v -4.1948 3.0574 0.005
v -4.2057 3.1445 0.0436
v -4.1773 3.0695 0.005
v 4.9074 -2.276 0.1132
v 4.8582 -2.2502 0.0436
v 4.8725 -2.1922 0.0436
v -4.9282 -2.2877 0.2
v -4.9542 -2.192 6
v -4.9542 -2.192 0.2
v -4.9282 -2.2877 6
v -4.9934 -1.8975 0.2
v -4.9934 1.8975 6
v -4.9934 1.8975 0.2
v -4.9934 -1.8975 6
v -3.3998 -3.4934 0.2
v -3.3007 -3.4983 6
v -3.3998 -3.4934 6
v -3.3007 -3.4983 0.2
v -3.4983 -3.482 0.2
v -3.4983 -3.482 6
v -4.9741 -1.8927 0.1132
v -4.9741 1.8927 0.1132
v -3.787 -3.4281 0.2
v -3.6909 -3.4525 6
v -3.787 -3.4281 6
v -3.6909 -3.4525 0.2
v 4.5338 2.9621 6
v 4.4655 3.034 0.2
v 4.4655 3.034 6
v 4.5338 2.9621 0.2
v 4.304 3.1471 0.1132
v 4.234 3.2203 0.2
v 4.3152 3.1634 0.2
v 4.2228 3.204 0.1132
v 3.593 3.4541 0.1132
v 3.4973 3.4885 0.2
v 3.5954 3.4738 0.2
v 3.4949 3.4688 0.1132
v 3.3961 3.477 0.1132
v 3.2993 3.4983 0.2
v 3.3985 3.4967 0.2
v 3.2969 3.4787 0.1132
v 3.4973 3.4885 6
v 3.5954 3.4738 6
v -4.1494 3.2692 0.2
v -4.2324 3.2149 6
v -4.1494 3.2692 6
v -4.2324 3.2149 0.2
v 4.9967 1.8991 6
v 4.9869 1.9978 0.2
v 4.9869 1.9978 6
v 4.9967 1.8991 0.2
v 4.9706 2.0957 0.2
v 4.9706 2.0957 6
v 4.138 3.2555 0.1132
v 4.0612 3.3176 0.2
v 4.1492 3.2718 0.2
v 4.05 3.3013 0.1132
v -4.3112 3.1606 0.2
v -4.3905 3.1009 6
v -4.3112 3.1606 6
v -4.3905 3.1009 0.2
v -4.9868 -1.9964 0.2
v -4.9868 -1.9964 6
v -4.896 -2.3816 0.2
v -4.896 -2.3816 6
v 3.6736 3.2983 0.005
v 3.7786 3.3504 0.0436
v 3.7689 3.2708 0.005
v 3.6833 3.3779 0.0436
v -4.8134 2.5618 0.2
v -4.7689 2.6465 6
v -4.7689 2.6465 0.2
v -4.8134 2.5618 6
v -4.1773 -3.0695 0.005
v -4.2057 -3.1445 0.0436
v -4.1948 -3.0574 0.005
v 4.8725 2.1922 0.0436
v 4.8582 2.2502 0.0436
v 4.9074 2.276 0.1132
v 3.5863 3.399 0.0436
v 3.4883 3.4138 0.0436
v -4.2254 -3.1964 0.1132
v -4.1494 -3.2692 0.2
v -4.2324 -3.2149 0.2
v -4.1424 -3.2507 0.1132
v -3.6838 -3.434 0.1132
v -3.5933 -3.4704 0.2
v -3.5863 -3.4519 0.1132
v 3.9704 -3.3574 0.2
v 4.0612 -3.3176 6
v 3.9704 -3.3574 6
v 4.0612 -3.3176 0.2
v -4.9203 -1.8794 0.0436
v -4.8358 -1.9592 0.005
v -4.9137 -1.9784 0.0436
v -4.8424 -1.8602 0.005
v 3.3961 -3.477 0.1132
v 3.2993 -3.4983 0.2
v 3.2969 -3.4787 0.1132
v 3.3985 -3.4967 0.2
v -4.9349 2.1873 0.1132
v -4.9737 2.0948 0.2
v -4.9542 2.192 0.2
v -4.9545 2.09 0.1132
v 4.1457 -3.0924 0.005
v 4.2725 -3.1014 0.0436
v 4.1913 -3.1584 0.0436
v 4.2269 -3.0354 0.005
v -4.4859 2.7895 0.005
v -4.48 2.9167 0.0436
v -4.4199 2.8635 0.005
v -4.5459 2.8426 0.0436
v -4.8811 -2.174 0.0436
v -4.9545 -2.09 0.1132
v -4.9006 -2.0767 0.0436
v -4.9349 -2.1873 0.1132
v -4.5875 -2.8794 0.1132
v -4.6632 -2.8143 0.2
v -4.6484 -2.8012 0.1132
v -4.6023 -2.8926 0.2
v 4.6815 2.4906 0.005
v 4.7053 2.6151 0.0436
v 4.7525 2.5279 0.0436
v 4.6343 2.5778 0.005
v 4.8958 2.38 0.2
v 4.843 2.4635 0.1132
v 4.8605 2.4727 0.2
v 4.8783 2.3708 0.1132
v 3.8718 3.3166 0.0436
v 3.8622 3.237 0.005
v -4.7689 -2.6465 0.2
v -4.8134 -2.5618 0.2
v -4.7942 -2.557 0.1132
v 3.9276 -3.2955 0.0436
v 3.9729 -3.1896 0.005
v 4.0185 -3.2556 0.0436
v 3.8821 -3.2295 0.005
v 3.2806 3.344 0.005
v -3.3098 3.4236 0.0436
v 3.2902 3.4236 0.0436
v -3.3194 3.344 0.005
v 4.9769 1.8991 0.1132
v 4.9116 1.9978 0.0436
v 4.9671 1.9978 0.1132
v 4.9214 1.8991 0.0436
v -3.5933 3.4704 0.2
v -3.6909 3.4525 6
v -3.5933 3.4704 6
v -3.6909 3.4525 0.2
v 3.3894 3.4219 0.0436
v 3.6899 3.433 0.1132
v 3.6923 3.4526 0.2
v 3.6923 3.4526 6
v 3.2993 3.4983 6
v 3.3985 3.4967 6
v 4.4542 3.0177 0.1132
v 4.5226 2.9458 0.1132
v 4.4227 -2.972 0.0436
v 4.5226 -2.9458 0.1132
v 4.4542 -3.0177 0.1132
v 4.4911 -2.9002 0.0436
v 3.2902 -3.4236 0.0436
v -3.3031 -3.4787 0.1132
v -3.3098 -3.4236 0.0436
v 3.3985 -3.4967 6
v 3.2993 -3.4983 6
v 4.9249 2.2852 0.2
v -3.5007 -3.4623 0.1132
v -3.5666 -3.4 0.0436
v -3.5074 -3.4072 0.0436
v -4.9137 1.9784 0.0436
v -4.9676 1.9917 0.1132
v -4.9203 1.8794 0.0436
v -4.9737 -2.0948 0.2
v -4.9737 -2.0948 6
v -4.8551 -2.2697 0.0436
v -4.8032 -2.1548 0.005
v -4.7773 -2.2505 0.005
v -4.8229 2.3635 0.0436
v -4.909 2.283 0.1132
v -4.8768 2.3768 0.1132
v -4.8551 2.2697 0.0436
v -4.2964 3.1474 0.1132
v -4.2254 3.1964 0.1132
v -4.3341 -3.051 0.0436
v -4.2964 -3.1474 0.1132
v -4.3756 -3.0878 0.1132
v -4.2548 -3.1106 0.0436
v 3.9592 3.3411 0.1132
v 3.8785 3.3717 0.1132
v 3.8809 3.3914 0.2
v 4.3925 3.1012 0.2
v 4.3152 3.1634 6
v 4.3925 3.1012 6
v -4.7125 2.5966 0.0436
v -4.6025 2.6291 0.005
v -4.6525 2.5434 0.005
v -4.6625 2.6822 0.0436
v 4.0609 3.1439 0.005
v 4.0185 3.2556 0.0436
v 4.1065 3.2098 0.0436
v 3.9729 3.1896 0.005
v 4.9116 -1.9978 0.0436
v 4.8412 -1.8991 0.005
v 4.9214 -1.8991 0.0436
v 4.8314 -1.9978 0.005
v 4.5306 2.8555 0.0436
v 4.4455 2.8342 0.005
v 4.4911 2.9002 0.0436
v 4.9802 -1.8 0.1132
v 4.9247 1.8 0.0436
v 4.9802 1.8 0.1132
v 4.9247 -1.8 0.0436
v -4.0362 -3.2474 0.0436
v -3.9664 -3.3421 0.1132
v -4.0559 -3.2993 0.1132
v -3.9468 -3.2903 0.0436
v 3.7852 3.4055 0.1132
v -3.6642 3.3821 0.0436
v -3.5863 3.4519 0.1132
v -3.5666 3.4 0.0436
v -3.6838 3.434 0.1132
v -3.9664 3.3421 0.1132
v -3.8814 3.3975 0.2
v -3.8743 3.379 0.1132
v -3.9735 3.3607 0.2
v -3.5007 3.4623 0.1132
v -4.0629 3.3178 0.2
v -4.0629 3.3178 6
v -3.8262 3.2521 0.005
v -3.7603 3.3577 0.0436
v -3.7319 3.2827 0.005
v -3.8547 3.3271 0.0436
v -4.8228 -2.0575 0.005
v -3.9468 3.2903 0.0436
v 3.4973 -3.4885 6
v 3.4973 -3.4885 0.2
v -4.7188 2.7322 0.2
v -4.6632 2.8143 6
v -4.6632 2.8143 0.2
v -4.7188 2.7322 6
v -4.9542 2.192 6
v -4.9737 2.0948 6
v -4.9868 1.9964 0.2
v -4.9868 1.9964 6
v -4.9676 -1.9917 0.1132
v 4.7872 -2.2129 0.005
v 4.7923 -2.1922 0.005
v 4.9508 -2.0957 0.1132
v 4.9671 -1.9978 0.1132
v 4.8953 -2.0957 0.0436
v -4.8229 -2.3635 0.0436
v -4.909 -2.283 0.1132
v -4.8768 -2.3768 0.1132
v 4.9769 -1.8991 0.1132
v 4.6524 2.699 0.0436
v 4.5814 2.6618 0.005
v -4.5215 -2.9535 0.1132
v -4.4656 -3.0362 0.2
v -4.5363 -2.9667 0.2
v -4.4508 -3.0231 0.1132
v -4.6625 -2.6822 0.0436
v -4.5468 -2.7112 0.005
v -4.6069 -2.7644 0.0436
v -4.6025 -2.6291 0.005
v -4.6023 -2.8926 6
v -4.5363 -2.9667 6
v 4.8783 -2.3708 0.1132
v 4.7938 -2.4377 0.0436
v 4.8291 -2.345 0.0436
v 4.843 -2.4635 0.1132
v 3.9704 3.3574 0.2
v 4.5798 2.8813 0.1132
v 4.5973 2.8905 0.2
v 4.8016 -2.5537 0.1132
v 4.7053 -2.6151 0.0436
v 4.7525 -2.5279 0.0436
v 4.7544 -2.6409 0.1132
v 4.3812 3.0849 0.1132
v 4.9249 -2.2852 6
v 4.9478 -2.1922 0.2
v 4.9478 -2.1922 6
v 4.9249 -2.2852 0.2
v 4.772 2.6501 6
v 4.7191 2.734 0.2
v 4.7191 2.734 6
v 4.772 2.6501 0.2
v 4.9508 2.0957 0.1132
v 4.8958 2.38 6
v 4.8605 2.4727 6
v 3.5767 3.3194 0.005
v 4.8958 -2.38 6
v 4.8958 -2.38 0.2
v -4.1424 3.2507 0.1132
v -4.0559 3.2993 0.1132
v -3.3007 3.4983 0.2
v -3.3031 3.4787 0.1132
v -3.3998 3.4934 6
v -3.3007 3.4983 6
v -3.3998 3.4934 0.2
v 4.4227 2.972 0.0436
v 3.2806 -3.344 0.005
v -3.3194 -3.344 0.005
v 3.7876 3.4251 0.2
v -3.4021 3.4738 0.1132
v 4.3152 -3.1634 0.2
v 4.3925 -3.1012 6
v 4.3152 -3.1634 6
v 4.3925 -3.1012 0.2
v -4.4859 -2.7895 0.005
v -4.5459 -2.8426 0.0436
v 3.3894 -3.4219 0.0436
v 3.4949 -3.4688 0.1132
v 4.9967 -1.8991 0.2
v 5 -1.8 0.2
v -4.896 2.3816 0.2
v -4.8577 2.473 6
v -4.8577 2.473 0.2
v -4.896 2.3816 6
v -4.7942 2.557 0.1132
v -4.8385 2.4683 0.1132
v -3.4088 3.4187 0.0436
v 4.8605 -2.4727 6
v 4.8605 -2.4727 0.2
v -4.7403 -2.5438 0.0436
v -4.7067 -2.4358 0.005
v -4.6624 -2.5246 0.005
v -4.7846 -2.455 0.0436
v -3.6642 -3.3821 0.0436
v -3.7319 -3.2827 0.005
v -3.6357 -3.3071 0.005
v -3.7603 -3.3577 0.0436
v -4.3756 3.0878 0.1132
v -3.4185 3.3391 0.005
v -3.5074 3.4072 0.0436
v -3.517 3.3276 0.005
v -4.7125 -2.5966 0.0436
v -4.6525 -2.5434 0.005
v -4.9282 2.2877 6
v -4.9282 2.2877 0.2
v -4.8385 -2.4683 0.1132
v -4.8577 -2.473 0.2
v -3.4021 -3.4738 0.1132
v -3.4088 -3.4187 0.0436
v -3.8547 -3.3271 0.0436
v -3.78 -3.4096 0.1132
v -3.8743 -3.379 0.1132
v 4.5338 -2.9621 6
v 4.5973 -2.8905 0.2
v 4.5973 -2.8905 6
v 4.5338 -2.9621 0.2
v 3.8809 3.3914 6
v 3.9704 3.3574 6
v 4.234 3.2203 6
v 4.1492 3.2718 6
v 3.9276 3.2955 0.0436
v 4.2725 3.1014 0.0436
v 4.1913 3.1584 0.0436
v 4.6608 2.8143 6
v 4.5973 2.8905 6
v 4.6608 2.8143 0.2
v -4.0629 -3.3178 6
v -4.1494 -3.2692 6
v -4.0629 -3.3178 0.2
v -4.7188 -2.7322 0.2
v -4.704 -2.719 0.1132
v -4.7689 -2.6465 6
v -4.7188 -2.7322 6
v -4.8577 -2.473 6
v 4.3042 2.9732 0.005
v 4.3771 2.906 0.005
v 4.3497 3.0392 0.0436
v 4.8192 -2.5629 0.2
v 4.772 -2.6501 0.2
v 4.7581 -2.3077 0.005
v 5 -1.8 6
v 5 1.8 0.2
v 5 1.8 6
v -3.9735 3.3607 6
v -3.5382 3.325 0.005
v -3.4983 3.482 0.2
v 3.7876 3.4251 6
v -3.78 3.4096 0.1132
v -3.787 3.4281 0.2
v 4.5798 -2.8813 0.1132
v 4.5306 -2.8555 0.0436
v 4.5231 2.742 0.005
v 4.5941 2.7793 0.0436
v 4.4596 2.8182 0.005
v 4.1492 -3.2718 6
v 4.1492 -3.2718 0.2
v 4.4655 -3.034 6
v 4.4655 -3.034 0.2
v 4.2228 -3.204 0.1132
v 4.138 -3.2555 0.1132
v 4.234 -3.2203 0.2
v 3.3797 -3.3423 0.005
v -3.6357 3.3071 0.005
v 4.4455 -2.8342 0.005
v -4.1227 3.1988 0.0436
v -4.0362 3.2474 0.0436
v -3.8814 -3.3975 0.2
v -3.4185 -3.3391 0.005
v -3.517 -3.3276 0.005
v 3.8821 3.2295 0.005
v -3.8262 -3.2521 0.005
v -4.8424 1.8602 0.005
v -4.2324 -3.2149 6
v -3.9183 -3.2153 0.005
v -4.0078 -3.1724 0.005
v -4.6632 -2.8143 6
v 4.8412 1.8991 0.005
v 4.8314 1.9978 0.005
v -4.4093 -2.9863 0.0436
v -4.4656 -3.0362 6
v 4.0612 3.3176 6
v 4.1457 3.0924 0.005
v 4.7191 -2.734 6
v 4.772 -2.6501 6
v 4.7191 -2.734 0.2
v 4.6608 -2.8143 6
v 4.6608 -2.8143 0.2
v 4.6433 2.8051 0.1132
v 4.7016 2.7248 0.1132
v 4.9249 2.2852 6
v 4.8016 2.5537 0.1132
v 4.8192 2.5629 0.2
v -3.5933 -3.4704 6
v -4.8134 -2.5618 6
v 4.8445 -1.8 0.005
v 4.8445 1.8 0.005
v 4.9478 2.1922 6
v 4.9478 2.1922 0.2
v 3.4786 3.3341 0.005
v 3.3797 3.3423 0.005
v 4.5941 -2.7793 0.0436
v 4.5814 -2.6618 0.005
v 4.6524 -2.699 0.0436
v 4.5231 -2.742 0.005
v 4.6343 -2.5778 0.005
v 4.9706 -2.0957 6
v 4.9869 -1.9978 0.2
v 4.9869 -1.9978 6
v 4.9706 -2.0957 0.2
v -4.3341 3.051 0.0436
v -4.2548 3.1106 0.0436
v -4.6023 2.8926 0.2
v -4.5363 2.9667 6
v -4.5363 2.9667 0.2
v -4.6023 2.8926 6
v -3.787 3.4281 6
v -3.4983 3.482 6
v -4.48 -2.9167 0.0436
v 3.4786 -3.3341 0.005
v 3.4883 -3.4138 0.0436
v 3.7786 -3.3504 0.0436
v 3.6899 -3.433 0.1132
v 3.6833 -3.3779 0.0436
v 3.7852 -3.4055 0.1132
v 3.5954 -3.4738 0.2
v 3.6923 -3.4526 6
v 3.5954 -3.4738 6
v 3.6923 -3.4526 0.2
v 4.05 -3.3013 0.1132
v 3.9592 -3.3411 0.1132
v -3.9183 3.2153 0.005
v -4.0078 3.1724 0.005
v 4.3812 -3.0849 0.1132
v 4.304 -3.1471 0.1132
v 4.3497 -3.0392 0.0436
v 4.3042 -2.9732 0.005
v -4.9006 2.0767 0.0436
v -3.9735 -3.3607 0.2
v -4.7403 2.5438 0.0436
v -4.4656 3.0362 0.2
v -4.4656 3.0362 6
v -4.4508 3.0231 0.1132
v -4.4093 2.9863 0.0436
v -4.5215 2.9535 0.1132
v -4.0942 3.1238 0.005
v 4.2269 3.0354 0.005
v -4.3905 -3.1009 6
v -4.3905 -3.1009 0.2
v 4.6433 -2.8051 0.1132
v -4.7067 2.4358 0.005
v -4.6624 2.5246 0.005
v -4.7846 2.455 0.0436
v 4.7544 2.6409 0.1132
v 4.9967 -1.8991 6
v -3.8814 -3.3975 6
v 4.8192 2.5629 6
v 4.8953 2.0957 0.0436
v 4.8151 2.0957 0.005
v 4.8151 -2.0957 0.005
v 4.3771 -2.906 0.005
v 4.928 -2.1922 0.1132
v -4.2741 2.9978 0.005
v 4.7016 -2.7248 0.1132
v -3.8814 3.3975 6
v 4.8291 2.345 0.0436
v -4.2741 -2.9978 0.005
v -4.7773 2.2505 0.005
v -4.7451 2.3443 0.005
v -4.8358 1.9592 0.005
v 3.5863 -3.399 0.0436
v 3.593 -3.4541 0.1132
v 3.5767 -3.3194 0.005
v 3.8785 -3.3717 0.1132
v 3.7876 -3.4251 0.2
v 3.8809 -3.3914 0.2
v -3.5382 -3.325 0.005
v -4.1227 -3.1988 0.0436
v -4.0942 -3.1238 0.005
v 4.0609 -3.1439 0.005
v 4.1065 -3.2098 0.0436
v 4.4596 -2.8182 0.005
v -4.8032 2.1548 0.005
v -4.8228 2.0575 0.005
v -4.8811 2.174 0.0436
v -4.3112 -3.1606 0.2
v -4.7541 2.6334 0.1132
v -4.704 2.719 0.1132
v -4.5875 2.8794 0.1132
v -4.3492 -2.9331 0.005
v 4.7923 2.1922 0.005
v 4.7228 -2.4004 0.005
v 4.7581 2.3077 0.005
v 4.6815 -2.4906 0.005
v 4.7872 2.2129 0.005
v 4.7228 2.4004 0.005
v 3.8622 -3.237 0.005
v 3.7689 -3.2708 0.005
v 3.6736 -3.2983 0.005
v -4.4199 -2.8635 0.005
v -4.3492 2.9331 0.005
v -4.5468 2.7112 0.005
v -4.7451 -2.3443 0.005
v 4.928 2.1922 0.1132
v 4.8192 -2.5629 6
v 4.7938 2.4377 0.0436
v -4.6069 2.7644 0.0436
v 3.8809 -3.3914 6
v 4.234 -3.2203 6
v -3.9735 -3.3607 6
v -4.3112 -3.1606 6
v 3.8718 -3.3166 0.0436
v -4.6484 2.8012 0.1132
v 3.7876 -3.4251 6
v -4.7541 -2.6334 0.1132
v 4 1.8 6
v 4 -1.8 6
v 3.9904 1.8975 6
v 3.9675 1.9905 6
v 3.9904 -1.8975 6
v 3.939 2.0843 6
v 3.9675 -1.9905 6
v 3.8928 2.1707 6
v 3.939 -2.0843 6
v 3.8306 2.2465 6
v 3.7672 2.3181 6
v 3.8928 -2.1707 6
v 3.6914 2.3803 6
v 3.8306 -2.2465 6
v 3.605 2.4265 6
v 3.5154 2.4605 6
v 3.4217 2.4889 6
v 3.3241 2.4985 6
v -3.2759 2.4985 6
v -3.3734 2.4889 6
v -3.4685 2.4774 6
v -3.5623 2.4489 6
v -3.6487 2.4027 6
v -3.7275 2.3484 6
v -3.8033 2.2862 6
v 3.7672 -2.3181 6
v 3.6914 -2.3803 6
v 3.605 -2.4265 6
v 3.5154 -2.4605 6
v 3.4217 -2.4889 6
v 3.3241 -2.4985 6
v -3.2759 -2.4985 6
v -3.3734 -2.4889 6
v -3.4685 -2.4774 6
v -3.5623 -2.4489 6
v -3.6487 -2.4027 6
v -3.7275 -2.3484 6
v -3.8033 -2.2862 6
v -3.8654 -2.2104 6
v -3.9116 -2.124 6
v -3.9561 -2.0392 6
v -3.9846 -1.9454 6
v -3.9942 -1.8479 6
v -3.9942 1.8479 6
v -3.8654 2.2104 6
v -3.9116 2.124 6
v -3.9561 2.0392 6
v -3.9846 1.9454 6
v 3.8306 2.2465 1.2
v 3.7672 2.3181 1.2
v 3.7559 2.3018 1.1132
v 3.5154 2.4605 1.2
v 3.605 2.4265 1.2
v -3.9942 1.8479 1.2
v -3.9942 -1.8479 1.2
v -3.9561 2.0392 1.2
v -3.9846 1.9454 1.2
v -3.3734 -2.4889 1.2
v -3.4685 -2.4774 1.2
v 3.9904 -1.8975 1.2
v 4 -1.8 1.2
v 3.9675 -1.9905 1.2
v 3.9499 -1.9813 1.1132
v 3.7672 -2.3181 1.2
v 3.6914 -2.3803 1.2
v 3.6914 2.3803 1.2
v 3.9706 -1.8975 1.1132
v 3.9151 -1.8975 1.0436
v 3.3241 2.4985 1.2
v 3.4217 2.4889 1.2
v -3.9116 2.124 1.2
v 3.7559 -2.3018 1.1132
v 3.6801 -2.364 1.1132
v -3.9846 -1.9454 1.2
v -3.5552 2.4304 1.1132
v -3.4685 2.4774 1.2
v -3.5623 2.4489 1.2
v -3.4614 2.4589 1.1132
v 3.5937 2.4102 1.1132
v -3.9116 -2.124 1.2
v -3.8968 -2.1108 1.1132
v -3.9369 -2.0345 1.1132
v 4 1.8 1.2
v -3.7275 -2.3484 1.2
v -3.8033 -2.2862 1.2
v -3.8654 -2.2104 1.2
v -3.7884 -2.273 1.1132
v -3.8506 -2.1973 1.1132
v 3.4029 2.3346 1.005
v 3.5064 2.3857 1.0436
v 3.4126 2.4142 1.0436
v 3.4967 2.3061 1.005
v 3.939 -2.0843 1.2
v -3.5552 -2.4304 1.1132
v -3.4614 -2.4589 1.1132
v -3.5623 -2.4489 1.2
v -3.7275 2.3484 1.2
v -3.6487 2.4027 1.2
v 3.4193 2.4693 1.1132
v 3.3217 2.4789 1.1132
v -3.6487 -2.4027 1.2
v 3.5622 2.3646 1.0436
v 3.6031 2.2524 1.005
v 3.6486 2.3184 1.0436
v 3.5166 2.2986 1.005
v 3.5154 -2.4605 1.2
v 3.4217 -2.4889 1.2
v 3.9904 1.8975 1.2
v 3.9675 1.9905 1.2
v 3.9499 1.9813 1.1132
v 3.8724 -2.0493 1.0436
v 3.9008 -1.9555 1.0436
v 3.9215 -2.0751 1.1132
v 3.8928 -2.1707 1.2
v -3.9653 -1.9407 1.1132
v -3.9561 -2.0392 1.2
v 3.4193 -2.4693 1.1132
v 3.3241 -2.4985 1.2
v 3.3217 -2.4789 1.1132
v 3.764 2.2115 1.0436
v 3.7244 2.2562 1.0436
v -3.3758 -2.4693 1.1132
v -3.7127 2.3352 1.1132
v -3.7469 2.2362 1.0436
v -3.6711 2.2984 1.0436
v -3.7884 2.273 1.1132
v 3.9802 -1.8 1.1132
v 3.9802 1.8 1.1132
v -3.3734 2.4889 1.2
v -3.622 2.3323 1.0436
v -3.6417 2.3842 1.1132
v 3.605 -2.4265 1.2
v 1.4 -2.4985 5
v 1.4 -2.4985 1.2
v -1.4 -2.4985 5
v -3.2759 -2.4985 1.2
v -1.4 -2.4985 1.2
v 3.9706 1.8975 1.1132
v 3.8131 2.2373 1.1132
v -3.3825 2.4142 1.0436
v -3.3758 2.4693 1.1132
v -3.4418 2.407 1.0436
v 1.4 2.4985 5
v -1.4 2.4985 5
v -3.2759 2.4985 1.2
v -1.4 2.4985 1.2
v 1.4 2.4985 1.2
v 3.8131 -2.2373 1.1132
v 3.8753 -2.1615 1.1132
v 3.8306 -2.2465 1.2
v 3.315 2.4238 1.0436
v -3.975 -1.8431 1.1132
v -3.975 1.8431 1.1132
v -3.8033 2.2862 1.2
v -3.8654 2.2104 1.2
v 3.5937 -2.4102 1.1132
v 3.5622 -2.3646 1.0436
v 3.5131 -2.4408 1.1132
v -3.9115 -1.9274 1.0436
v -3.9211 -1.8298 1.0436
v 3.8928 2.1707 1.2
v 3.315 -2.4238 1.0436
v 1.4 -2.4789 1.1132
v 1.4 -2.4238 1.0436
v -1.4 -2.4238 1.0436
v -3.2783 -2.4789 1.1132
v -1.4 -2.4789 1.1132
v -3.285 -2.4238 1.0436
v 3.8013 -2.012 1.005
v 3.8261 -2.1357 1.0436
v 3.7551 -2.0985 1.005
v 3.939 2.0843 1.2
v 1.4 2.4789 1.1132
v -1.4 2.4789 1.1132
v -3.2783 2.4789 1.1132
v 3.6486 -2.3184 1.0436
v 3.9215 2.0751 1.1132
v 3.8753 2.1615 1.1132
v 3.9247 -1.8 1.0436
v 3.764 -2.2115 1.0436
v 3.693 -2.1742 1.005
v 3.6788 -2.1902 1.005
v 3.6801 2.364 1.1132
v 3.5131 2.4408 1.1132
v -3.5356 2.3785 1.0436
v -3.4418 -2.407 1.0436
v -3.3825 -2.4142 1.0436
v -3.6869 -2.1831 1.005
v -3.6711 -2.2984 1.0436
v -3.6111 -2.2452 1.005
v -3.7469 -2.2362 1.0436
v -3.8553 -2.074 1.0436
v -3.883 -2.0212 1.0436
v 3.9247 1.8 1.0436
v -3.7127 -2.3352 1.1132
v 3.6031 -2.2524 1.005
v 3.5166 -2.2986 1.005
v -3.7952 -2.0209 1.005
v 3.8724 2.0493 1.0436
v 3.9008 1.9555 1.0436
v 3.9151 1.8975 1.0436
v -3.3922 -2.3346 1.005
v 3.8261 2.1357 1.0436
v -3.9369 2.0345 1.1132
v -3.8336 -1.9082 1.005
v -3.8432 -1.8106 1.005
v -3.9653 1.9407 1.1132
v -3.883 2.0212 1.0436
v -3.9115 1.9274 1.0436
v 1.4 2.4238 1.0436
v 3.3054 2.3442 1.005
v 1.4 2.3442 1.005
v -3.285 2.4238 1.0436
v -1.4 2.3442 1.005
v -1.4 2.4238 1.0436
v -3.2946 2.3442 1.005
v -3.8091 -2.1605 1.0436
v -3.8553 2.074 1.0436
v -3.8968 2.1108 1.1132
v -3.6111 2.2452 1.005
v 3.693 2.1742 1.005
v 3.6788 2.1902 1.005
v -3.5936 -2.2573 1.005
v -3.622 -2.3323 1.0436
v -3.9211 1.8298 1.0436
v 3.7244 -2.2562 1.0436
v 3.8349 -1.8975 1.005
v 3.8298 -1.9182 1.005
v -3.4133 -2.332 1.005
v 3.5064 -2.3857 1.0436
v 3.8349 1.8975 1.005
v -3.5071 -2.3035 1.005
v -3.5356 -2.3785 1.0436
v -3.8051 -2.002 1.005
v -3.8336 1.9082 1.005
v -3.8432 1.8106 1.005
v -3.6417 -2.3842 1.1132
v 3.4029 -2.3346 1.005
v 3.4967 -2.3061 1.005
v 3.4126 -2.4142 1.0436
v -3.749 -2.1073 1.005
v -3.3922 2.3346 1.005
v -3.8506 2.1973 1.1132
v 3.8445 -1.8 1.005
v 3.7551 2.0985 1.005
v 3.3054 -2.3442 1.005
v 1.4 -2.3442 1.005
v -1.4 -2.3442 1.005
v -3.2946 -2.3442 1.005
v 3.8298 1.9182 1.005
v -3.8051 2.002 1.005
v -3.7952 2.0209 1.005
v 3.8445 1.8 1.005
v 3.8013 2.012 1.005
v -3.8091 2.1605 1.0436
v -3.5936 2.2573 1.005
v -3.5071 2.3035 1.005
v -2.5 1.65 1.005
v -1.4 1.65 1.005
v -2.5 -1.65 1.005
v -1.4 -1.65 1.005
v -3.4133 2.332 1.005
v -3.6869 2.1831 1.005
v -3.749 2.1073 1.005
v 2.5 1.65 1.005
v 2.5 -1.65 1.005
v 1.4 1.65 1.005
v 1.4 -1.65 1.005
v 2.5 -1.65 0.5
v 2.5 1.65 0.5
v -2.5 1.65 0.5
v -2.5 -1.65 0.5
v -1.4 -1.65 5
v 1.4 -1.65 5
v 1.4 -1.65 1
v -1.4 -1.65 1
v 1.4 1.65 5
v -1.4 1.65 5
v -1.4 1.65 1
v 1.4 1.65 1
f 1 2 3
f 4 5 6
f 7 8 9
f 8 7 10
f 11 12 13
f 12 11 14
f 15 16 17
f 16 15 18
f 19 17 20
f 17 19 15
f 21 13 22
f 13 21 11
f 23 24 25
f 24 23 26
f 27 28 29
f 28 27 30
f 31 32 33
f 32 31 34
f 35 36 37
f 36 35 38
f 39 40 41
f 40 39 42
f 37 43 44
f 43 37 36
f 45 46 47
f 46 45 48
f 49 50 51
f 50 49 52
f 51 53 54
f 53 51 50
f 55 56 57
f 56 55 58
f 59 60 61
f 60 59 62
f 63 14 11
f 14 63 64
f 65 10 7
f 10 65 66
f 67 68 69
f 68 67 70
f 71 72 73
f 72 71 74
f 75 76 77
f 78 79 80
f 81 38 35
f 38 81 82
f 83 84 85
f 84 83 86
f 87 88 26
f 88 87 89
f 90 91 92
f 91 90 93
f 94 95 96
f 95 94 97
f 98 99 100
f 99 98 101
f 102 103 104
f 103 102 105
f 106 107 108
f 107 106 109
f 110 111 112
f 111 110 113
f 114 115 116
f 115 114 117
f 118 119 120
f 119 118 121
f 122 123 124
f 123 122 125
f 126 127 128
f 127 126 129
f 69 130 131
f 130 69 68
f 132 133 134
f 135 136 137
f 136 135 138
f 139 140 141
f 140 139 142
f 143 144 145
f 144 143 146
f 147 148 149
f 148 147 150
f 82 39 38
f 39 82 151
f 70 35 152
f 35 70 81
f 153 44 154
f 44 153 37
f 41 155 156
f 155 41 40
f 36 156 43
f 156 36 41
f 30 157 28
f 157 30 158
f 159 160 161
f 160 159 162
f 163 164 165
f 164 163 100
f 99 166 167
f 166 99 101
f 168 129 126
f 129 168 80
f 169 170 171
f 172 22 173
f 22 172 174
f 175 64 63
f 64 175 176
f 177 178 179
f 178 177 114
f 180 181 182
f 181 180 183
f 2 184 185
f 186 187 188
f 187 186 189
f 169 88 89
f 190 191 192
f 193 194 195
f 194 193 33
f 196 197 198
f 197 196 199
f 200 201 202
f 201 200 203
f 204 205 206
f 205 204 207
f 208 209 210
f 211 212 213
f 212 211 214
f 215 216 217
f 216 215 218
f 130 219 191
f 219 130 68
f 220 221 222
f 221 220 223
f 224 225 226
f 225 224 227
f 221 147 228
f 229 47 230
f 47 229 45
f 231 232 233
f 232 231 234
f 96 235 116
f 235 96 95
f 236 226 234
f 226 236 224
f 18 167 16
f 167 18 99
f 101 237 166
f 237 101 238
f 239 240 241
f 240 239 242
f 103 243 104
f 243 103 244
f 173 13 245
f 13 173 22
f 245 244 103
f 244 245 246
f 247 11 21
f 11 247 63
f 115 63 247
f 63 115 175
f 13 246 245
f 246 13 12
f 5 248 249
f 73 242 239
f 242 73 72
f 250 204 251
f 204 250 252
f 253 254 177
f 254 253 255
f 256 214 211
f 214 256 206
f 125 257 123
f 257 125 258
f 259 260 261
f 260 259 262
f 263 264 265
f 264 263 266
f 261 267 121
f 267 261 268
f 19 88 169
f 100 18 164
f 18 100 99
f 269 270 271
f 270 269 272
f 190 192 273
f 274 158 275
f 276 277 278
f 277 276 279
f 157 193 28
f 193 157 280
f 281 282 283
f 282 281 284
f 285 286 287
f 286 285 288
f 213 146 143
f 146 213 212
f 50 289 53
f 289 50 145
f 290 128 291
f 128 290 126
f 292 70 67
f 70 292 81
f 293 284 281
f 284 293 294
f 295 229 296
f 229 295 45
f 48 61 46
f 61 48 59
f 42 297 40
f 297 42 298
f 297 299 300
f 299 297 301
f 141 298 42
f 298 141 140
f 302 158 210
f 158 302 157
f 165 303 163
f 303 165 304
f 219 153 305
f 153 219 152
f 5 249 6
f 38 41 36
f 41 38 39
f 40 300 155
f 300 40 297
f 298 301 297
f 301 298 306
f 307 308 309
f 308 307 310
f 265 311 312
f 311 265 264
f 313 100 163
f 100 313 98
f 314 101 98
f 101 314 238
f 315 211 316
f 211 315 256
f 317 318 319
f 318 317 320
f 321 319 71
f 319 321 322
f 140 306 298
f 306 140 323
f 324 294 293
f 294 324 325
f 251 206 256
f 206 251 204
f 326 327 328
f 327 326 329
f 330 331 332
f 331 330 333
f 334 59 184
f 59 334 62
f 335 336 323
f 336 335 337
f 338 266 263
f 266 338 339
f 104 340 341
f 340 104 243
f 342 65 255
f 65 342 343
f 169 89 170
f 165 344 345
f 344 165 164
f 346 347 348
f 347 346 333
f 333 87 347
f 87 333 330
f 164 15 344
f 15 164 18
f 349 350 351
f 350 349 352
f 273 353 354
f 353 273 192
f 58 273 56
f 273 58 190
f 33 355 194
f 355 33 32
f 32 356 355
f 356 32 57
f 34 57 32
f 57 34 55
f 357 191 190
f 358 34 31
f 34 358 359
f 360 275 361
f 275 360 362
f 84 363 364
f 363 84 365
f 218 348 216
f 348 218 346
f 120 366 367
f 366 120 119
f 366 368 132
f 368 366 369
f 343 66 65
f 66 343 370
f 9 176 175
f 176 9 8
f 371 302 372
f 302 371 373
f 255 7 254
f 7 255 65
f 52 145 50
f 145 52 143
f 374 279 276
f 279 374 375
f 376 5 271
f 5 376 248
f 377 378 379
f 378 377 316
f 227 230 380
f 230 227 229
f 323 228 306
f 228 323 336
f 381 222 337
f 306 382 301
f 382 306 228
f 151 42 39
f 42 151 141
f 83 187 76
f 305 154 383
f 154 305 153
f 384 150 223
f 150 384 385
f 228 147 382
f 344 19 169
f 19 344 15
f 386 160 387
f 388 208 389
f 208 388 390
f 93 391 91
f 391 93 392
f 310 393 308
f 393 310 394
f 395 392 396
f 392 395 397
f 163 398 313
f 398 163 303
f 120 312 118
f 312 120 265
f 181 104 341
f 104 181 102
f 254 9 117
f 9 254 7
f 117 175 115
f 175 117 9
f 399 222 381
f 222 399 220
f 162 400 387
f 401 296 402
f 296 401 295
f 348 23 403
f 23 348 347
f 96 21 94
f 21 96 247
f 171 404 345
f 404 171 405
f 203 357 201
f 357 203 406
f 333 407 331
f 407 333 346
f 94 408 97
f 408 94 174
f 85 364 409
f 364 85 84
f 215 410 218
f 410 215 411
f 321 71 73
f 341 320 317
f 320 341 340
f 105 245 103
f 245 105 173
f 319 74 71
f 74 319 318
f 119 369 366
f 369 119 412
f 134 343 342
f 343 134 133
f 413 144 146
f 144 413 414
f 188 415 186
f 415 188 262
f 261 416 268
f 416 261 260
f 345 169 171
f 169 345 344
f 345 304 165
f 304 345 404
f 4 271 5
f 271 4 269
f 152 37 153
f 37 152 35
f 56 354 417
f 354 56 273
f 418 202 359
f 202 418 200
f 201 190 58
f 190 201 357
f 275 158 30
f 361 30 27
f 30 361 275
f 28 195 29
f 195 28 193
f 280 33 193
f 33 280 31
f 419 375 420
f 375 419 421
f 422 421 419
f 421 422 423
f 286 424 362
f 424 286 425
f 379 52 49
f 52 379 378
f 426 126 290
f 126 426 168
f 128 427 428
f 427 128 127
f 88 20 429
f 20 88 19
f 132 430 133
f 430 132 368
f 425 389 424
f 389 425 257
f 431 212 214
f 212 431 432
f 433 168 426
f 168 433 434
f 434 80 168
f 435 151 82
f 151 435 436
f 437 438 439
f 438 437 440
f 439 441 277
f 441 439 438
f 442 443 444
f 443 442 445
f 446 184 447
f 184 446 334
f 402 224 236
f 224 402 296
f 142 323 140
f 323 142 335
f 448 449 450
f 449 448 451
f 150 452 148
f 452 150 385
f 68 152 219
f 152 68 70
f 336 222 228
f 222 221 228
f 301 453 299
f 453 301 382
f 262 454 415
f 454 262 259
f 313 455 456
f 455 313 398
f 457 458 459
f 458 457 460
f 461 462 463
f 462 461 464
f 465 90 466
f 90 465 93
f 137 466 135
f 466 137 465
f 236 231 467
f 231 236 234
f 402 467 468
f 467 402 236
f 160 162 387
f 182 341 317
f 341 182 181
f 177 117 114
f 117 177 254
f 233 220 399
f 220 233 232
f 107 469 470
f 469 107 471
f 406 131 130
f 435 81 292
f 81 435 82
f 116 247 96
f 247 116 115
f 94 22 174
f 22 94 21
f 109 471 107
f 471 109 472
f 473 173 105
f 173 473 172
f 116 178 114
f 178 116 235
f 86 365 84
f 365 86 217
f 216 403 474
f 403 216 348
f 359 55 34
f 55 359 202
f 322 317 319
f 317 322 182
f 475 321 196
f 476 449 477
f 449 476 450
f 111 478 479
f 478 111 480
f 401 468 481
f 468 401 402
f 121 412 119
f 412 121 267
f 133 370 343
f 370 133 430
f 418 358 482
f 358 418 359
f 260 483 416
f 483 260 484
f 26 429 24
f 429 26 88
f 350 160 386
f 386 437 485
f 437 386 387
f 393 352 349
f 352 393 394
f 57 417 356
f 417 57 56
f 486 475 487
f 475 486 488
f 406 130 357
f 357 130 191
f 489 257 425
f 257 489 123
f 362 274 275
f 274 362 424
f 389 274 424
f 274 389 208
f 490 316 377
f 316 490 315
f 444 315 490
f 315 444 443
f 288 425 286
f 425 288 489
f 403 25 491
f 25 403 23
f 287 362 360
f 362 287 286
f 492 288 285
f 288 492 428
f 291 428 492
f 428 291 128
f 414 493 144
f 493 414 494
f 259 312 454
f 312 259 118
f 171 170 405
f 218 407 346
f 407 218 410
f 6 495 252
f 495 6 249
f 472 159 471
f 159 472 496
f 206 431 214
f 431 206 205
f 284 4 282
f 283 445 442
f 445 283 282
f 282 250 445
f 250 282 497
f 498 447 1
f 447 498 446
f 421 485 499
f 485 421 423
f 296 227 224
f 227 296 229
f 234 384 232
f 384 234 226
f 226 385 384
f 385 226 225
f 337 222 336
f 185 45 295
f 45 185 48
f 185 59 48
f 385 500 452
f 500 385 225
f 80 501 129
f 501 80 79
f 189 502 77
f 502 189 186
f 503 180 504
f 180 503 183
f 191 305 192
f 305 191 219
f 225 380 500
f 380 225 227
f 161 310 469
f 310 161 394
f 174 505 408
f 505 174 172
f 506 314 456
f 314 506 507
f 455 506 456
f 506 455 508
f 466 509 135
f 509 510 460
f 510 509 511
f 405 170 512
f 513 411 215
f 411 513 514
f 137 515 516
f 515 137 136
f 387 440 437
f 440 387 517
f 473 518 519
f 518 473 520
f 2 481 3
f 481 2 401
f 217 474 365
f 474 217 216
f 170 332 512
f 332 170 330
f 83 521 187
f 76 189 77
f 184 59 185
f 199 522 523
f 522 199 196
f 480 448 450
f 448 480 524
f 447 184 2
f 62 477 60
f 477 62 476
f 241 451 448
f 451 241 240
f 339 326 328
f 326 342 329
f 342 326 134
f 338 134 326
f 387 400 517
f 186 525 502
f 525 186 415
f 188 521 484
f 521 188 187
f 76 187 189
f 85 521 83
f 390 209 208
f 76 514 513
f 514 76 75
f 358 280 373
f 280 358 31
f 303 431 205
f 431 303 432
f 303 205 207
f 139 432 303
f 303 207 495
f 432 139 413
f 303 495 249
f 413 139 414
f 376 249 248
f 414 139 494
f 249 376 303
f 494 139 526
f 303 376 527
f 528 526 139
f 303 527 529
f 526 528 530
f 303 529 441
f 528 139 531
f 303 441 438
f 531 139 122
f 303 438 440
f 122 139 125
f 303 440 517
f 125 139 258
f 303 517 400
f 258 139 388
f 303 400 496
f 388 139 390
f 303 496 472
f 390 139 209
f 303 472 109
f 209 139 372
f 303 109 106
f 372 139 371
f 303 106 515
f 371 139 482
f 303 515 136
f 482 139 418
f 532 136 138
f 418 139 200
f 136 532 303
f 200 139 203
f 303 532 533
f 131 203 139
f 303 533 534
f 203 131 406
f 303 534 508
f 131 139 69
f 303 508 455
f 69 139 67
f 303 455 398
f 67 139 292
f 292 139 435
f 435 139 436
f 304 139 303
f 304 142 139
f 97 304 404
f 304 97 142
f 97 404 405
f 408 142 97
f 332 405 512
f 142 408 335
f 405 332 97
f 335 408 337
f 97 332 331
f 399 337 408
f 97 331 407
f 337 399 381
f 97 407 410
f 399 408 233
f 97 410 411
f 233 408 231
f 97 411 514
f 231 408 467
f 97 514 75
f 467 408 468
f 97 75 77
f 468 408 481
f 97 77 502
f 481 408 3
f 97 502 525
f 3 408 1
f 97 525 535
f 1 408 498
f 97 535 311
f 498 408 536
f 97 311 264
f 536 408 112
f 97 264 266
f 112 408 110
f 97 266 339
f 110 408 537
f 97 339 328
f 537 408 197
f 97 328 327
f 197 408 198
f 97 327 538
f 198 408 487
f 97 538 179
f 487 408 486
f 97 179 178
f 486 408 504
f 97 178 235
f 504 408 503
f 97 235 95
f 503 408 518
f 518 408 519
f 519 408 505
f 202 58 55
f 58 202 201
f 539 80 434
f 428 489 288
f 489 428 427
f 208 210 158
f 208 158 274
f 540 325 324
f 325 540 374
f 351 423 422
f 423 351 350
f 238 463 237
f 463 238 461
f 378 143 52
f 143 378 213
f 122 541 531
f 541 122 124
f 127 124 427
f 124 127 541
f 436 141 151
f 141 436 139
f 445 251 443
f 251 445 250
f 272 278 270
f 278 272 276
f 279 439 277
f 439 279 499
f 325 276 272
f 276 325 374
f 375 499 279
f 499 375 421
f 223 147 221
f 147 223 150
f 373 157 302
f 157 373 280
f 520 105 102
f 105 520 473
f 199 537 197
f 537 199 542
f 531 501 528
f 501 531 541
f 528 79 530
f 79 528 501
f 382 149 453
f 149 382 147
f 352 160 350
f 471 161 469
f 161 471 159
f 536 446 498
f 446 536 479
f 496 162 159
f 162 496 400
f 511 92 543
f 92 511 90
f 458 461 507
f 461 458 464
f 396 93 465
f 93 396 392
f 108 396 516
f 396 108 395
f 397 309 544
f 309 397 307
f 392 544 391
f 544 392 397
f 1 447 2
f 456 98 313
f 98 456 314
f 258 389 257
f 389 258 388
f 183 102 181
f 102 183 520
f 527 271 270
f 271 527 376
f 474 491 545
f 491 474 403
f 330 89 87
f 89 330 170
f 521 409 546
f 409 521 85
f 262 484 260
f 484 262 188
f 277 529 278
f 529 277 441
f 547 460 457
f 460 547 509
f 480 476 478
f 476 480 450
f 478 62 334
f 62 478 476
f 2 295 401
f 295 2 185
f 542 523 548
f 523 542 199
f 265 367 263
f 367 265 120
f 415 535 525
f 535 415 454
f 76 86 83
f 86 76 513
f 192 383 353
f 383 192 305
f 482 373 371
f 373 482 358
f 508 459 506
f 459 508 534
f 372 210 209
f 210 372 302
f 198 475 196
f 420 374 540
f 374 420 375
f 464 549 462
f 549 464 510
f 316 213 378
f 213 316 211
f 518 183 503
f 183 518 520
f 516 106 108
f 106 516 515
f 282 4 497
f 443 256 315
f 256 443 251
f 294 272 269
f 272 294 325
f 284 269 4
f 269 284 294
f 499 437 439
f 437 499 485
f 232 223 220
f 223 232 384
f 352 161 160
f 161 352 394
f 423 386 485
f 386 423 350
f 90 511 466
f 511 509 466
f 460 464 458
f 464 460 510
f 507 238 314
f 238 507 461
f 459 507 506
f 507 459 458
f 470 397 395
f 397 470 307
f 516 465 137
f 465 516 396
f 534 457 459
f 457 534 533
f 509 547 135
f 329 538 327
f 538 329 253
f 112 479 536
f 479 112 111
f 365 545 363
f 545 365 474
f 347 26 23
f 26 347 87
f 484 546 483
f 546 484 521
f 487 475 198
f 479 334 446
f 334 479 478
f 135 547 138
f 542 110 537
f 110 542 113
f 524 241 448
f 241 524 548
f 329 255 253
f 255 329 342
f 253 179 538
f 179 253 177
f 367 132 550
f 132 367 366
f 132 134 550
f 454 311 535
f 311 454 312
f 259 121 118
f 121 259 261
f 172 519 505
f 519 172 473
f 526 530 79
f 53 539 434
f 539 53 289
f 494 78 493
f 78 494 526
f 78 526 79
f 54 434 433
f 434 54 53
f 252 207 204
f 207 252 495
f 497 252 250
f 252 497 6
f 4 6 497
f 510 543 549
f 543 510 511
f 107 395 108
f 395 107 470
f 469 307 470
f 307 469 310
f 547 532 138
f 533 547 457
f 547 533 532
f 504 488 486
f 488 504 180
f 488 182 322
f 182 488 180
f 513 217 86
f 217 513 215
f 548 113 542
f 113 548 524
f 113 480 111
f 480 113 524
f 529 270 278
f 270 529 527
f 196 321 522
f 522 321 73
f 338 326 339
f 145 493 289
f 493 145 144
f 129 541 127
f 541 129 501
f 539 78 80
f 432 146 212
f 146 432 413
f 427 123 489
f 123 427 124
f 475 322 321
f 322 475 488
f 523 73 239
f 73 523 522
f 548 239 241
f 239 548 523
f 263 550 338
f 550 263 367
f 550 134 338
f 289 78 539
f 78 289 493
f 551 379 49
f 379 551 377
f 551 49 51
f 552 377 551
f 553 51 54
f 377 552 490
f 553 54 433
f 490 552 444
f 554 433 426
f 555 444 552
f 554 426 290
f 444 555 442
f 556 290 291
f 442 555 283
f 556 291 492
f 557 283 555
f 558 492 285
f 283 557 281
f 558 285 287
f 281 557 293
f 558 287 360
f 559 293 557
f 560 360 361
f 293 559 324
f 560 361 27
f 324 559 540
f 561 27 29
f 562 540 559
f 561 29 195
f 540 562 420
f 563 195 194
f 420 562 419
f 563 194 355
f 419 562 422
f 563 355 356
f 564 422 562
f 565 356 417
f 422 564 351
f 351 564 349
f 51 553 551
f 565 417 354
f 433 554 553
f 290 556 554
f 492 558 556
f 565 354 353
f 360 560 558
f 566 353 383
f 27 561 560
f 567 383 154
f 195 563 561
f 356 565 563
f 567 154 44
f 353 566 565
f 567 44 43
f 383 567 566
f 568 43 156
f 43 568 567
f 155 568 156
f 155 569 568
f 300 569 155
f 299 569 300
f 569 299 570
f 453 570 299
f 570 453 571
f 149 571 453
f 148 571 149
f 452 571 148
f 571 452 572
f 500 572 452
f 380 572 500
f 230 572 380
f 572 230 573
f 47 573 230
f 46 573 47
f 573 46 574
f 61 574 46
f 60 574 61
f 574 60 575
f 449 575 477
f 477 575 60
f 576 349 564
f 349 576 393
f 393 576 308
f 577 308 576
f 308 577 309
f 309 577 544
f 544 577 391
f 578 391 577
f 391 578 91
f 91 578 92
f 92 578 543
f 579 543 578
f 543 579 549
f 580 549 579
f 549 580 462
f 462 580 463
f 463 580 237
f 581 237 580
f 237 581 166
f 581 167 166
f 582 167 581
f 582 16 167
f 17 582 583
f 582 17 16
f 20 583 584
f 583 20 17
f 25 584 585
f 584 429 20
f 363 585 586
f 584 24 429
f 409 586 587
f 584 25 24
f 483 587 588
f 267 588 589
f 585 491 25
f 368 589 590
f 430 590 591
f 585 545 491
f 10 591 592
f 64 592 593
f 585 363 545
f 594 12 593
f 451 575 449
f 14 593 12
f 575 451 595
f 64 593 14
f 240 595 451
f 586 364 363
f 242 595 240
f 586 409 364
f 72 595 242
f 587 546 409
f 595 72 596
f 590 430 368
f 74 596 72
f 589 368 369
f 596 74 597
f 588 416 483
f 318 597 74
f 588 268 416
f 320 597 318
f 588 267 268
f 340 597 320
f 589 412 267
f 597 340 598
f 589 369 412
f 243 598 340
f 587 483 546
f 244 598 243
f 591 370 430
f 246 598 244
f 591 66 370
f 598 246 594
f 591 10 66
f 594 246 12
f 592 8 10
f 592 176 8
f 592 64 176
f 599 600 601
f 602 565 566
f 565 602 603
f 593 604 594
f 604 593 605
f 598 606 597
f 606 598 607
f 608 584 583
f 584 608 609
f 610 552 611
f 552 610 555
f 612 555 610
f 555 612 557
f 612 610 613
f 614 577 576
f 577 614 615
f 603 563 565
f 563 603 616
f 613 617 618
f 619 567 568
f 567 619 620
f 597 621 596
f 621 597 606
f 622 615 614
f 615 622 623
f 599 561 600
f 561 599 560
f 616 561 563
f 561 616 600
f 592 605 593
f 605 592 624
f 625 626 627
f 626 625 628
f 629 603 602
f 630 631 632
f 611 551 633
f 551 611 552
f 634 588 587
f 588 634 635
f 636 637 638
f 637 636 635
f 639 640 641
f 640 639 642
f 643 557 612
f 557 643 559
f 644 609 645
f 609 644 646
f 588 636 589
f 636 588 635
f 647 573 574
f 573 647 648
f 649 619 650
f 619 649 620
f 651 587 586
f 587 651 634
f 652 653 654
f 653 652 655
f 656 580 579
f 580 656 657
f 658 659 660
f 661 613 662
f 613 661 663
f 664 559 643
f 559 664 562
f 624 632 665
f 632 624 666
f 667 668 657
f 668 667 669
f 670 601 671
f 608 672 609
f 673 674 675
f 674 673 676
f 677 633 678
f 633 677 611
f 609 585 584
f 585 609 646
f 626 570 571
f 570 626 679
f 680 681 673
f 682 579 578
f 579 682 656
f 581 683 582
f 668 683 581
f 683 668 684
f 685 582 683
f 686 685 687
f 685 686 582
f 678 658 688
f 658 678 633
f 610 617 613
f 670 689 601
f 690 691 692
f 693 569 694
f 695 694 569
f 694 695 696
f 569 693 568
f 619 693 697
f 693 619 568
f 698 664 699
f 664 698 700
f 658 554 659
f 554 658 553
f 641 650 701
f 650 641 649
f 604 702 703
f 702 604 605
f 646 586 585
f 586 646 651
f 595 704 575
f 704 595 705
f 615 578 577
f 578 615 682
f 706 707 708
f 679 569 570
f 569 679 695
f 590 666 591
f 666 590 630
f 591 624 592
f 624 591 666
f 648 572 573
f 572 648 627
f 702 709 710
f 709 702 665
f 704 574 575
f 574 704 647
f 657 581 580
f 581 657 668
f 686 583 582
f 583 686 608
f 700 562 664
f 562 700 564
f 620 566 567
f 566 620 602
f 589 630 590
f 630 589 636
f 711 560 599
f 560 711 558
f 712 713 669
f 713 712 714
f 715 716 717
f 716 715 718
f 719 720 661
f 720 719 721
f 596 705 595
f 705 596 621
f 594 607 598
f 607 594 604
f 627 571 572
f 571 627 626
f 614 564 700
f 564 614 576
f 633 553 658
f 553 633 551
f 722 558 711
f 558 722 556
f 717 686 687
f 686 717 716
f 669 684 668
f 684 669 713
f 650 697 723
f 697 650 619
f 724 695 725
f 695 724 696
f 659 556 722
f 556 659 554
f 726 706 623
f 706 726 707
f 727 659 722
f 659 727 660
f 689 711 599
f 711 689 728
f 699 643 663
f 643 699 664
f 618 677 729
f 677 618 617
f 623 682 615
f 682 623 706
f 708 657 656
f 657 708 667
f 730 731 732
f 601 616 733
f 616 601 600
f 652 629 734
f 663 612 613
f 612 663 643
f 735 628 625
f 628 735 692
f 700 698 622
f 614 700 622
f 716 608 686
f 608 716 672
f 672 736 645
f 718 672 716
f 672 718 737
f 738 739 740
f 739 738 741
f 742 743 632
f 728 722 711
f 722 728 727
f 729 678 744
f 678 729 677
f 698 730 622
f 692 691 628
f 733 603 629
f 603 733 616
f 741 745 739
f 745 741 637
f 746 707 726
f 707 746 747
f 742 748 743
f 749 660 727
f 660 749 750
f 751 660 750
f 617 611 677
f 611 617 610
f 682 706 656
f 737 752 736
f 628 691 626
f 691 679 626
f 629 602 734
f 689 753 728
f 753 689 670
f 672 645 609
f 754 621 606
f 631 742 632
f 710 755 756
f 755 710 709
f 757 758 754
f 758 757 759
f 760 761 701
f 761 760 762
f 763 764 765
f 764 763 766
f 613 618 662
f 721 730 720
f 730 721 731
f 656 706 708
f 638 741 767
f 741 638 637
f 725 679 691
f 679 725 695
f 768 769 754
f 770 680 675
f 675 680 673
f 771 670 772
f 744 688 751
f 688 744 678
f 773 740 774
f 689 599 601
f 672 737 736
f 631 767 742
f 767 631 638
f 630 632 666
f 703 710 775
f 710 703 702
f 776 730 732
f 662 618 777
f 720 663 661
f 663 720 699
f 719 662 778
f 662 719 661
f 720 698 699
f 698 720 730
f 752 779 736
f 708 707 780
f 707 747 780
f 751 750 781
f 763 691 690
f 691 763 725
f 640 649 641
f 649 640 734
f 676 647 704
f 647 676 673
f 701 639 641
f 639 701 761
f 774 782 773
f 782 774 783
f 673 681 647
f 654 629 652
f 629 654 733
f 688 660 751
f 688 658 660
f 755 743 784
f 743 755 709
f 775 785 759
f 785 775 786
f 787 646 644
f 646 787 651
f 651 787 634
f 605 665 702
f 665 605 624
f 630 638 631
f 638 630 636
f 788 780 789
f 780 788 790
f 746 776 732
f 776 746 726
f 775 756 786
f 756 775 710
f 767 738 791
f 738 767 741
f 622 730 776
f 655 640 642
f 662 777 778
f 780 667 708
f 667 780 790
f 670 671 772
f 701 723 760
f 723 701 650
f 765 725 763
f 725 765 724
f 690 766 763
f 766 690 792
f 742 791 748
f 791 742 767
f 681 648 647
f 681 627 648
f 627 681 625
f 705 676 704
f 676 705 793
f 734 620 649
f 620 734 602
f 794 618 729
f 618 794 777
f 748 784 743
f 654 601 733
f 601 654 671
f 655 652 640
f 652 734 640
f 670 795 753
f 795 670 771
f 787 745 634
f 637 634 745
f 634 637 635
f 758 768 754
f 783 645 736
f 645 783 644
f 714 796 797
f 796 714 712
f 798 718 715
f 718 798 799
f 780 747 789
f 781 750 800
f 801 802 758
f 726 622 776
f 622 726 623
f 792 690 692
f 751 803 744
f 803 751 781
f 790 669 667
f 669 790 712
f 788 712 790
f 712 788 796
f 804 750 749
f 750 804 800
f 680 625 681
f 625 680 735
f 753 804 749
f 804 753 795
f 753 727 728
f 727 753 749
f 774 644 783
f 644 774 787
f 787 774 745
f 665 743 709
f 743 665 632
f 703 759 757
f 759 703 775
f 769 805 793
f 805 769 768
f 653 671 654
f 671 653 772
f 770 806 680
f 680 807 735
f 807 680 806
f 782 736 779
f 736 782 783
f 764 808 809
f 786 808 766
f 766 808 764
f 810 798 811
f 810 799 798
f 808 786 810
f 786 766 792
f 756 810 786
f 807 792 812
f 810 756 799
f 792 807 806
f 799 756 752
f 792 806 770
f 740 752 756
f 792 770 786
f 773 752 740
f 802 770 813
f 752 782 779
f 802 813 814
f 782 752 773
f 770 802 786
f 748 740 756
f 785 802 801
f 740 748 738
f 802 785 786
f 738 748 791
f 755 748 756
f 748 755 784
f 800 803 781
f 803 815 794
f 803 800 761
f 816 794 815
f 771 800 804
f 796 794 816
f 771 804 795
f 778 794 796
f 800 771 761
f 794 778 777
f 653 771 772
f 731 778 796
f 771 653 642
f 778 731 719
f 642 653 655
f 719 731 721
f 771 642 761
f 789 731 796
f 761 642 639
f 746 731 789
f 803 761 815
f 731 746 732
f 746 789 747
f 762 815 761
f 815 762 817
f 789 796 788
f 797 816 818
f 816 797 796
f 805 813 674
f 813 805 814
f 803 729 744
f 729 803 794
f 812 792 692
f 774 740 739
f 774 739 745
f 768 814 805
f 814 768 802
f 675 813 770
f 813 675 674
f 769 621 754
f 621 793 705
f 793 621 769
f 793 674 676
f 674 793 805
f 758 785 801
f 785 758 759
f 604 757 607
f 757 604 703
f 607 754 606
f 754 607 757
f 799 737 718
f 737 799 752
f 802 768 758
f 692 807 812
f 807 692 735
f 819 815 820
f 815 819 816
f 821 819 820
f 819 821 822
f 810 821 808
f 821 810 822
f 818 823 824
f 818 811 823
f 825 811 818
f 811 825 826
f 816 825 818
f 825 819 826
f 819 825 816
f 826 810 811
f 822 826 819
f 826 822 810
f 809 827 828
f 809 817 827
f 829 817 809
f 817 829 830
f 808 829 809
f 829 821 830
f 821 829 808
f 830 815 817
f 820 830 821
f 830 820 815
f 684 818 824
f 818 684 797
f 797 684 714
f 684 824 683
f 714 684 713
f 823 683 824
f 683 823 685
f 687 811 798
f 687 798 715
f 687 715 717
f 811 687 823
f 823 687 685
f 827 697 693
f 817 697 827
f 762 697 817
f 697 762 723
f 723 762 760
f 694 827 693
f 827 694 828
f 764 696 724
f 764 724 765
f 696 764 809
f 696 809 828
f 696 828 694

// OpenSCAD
$fs = 0.1;
$fa = 1;

// ----------------------------------------
// cap

module capsolid(w, h, d, rh, rv)
{
    difference()
    {
        minkowski()
        {
            minkowski()
            {
                cube([w-rh*2-rv*2, h-rh*2-rv*2, d*2-rh*2-rv*2], center=true);
                cylinder(r=rh, h=rh);
            }
            sphere(rv);
        }
        translate([0, 0, -d])
            cube([w*2, h*2, d*2], center=true);
    }
}

module capshell(w, h, d)
{
    rho = 1.5;
    rhi = 0.5;
    rv = 0.2;
    difference()
    {
        capsolid(w, h, d, rho, rv);
        translate([0, 0, -1]) capsolid(w-2, h-2, d, rhi, rv);
    }
}

dx = 10;
dy = 7;
dz = 6;
wstem = 3.3;
hstem = 4;
sp = 4;

module cap()
{
    difference()
    {
        capshell(dx, dy, dz);
        translate([0, 0, dz-1])
            cube([5, wstem, 1], center=true);
    }
    translate([0,  wstem/2+0.5, hstem/2+1])
        cube([wstem-0.5, 1, hstem], center=true);
    translate([0, -wstem/2-0.5, hstem/2+1])
        cube([wstem-0.5, 1, hstem], center=true);
}

// ----------------------------------------
// output

printmulti = false;
printsingle = true;
xsect = false;

if(printmulti)
{
    for(x = [-0.5, 0.5])
    {
        for(y = [-0.5, 0.5])
        {
            translate([x * (dx + sp), y * (dy + sp)])
                rotate(a=180, v=[1, 0, 0])
                    translate([0, 0, -dz])
                        cap();
        }
    }
}
else if(printsingle)
{
    rotate(a=180, v=[1, 0, 0])
        translate([0, 0, -dz])
            cap();
}
else if(xsect)
{
    difference()
    {
        cap();
        translate([0, -10, 0])
            cube([20, 20, 20], center=true);
    }
}
else
{
    cap();
}
